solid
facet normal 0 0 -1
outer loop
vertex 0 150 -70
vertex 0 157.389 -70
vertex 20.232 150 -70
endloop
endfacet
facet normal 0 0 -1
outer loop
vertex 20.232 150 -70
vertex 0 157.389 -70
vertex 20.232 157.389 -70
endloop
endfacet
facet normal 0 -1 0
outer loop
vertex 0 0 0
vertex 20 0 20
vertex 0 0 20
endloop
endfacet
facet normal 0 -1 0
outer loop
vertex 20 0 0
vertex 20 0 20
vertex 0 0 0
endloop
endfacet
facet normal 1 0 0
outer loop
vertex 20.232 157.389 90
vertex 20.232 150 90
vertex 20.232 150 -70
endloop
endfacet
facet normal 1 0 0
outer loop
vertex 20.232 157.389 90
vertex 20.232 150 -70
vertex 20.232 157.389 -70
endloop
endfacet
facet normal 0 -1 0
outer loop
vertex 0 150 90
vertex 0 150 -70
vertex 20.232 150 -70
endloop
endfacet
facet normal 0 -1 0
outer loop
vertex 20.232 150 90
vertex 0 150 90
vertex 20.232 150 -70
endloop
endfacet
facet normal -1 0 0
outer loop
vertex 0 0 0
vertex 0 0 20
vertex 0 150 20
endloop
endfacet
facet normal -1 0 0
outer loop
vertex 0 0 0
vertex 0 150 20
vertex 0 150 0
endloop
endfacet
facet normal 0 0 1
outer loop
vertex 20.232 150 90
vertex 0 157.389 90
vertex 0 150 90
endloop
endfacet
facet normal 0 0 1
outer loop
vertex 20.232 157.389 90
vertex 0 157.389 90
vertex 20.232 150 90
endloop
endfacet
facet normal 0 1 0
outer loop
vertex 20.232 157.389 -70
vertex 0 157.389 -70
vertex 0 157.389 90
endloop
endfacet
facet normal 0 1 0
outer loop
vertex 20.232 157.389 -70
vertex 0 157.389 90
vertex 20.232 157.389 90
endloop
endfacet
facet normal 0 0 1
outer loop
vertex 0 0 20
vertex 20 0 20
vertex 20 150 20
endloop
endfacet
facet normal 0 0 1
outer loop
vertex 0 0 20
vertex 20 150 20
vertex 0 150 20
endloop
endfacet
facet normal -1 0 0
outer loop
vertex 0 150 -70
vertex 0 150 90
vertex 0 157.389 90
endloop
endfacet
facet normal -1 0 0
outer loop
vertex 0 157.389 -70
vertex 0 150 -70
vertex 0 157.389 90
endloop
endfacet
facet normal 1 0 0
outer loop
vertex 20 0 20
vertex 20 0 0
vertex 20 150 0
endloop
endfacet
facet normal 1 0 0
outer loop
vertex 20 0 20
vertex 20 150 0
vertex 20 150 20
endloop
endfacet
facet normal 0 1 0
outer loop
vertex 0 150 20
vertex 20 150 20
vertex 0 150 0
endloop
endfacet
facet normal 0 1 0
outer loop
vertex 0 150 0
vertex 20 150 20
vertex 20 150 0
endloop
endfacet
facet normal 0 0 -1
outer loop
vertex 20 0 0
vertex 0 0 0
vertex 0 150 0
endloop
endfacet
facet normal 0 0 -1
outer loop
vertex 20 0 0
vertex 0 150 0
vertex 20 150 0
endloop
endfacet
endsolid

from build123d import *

# Parameters (mm, degrees)
EXTRUDE_1_DEPTH      = 150
EXTRUDE_2_DEPTH      = 70
EXTRUDE_2_DEPTH_BACK = 90
SKETCH_7_W           = 20.232494165
SKETCH_7_H           = 7.389232753


with BuildPart() as part:
    # Sketch 3D_1 → 凸台-拉伸1 (new body)
    with BuildSketch(Plane(origin=(0, 0, 0), x_dir=(0.7071067811865476, 0, 0.7071067811865476), z_dir=(0, 1, 0))):
        Polygon((0, 0), (14.142135624, 14.142135624), (28.284271247, 0), (14.142135624, -14.142135624), align=None)
    extrude(amount=EXTRUDE_1_DEPTH)


with BuildPart() as body_2:
    # 草图7 → 凸台-拉伸2 (new, two sides: drawn at the far end of the back side and taken through both)
    with BuildSketch(Plane.XY.offset(20).offset(-EXTRUDE_2_DEPTH_BACK)):
        with Locations((10.116247083, 153.694616376)):
            Rectangle(SKETCH_7_W, SKETCH_7_H)
    extrude(amount=EXTRUDE_2_DEPTH + EXTRUDE_2_DEPTH_BACK)


solid = Compound([part.part, body_2.part])
